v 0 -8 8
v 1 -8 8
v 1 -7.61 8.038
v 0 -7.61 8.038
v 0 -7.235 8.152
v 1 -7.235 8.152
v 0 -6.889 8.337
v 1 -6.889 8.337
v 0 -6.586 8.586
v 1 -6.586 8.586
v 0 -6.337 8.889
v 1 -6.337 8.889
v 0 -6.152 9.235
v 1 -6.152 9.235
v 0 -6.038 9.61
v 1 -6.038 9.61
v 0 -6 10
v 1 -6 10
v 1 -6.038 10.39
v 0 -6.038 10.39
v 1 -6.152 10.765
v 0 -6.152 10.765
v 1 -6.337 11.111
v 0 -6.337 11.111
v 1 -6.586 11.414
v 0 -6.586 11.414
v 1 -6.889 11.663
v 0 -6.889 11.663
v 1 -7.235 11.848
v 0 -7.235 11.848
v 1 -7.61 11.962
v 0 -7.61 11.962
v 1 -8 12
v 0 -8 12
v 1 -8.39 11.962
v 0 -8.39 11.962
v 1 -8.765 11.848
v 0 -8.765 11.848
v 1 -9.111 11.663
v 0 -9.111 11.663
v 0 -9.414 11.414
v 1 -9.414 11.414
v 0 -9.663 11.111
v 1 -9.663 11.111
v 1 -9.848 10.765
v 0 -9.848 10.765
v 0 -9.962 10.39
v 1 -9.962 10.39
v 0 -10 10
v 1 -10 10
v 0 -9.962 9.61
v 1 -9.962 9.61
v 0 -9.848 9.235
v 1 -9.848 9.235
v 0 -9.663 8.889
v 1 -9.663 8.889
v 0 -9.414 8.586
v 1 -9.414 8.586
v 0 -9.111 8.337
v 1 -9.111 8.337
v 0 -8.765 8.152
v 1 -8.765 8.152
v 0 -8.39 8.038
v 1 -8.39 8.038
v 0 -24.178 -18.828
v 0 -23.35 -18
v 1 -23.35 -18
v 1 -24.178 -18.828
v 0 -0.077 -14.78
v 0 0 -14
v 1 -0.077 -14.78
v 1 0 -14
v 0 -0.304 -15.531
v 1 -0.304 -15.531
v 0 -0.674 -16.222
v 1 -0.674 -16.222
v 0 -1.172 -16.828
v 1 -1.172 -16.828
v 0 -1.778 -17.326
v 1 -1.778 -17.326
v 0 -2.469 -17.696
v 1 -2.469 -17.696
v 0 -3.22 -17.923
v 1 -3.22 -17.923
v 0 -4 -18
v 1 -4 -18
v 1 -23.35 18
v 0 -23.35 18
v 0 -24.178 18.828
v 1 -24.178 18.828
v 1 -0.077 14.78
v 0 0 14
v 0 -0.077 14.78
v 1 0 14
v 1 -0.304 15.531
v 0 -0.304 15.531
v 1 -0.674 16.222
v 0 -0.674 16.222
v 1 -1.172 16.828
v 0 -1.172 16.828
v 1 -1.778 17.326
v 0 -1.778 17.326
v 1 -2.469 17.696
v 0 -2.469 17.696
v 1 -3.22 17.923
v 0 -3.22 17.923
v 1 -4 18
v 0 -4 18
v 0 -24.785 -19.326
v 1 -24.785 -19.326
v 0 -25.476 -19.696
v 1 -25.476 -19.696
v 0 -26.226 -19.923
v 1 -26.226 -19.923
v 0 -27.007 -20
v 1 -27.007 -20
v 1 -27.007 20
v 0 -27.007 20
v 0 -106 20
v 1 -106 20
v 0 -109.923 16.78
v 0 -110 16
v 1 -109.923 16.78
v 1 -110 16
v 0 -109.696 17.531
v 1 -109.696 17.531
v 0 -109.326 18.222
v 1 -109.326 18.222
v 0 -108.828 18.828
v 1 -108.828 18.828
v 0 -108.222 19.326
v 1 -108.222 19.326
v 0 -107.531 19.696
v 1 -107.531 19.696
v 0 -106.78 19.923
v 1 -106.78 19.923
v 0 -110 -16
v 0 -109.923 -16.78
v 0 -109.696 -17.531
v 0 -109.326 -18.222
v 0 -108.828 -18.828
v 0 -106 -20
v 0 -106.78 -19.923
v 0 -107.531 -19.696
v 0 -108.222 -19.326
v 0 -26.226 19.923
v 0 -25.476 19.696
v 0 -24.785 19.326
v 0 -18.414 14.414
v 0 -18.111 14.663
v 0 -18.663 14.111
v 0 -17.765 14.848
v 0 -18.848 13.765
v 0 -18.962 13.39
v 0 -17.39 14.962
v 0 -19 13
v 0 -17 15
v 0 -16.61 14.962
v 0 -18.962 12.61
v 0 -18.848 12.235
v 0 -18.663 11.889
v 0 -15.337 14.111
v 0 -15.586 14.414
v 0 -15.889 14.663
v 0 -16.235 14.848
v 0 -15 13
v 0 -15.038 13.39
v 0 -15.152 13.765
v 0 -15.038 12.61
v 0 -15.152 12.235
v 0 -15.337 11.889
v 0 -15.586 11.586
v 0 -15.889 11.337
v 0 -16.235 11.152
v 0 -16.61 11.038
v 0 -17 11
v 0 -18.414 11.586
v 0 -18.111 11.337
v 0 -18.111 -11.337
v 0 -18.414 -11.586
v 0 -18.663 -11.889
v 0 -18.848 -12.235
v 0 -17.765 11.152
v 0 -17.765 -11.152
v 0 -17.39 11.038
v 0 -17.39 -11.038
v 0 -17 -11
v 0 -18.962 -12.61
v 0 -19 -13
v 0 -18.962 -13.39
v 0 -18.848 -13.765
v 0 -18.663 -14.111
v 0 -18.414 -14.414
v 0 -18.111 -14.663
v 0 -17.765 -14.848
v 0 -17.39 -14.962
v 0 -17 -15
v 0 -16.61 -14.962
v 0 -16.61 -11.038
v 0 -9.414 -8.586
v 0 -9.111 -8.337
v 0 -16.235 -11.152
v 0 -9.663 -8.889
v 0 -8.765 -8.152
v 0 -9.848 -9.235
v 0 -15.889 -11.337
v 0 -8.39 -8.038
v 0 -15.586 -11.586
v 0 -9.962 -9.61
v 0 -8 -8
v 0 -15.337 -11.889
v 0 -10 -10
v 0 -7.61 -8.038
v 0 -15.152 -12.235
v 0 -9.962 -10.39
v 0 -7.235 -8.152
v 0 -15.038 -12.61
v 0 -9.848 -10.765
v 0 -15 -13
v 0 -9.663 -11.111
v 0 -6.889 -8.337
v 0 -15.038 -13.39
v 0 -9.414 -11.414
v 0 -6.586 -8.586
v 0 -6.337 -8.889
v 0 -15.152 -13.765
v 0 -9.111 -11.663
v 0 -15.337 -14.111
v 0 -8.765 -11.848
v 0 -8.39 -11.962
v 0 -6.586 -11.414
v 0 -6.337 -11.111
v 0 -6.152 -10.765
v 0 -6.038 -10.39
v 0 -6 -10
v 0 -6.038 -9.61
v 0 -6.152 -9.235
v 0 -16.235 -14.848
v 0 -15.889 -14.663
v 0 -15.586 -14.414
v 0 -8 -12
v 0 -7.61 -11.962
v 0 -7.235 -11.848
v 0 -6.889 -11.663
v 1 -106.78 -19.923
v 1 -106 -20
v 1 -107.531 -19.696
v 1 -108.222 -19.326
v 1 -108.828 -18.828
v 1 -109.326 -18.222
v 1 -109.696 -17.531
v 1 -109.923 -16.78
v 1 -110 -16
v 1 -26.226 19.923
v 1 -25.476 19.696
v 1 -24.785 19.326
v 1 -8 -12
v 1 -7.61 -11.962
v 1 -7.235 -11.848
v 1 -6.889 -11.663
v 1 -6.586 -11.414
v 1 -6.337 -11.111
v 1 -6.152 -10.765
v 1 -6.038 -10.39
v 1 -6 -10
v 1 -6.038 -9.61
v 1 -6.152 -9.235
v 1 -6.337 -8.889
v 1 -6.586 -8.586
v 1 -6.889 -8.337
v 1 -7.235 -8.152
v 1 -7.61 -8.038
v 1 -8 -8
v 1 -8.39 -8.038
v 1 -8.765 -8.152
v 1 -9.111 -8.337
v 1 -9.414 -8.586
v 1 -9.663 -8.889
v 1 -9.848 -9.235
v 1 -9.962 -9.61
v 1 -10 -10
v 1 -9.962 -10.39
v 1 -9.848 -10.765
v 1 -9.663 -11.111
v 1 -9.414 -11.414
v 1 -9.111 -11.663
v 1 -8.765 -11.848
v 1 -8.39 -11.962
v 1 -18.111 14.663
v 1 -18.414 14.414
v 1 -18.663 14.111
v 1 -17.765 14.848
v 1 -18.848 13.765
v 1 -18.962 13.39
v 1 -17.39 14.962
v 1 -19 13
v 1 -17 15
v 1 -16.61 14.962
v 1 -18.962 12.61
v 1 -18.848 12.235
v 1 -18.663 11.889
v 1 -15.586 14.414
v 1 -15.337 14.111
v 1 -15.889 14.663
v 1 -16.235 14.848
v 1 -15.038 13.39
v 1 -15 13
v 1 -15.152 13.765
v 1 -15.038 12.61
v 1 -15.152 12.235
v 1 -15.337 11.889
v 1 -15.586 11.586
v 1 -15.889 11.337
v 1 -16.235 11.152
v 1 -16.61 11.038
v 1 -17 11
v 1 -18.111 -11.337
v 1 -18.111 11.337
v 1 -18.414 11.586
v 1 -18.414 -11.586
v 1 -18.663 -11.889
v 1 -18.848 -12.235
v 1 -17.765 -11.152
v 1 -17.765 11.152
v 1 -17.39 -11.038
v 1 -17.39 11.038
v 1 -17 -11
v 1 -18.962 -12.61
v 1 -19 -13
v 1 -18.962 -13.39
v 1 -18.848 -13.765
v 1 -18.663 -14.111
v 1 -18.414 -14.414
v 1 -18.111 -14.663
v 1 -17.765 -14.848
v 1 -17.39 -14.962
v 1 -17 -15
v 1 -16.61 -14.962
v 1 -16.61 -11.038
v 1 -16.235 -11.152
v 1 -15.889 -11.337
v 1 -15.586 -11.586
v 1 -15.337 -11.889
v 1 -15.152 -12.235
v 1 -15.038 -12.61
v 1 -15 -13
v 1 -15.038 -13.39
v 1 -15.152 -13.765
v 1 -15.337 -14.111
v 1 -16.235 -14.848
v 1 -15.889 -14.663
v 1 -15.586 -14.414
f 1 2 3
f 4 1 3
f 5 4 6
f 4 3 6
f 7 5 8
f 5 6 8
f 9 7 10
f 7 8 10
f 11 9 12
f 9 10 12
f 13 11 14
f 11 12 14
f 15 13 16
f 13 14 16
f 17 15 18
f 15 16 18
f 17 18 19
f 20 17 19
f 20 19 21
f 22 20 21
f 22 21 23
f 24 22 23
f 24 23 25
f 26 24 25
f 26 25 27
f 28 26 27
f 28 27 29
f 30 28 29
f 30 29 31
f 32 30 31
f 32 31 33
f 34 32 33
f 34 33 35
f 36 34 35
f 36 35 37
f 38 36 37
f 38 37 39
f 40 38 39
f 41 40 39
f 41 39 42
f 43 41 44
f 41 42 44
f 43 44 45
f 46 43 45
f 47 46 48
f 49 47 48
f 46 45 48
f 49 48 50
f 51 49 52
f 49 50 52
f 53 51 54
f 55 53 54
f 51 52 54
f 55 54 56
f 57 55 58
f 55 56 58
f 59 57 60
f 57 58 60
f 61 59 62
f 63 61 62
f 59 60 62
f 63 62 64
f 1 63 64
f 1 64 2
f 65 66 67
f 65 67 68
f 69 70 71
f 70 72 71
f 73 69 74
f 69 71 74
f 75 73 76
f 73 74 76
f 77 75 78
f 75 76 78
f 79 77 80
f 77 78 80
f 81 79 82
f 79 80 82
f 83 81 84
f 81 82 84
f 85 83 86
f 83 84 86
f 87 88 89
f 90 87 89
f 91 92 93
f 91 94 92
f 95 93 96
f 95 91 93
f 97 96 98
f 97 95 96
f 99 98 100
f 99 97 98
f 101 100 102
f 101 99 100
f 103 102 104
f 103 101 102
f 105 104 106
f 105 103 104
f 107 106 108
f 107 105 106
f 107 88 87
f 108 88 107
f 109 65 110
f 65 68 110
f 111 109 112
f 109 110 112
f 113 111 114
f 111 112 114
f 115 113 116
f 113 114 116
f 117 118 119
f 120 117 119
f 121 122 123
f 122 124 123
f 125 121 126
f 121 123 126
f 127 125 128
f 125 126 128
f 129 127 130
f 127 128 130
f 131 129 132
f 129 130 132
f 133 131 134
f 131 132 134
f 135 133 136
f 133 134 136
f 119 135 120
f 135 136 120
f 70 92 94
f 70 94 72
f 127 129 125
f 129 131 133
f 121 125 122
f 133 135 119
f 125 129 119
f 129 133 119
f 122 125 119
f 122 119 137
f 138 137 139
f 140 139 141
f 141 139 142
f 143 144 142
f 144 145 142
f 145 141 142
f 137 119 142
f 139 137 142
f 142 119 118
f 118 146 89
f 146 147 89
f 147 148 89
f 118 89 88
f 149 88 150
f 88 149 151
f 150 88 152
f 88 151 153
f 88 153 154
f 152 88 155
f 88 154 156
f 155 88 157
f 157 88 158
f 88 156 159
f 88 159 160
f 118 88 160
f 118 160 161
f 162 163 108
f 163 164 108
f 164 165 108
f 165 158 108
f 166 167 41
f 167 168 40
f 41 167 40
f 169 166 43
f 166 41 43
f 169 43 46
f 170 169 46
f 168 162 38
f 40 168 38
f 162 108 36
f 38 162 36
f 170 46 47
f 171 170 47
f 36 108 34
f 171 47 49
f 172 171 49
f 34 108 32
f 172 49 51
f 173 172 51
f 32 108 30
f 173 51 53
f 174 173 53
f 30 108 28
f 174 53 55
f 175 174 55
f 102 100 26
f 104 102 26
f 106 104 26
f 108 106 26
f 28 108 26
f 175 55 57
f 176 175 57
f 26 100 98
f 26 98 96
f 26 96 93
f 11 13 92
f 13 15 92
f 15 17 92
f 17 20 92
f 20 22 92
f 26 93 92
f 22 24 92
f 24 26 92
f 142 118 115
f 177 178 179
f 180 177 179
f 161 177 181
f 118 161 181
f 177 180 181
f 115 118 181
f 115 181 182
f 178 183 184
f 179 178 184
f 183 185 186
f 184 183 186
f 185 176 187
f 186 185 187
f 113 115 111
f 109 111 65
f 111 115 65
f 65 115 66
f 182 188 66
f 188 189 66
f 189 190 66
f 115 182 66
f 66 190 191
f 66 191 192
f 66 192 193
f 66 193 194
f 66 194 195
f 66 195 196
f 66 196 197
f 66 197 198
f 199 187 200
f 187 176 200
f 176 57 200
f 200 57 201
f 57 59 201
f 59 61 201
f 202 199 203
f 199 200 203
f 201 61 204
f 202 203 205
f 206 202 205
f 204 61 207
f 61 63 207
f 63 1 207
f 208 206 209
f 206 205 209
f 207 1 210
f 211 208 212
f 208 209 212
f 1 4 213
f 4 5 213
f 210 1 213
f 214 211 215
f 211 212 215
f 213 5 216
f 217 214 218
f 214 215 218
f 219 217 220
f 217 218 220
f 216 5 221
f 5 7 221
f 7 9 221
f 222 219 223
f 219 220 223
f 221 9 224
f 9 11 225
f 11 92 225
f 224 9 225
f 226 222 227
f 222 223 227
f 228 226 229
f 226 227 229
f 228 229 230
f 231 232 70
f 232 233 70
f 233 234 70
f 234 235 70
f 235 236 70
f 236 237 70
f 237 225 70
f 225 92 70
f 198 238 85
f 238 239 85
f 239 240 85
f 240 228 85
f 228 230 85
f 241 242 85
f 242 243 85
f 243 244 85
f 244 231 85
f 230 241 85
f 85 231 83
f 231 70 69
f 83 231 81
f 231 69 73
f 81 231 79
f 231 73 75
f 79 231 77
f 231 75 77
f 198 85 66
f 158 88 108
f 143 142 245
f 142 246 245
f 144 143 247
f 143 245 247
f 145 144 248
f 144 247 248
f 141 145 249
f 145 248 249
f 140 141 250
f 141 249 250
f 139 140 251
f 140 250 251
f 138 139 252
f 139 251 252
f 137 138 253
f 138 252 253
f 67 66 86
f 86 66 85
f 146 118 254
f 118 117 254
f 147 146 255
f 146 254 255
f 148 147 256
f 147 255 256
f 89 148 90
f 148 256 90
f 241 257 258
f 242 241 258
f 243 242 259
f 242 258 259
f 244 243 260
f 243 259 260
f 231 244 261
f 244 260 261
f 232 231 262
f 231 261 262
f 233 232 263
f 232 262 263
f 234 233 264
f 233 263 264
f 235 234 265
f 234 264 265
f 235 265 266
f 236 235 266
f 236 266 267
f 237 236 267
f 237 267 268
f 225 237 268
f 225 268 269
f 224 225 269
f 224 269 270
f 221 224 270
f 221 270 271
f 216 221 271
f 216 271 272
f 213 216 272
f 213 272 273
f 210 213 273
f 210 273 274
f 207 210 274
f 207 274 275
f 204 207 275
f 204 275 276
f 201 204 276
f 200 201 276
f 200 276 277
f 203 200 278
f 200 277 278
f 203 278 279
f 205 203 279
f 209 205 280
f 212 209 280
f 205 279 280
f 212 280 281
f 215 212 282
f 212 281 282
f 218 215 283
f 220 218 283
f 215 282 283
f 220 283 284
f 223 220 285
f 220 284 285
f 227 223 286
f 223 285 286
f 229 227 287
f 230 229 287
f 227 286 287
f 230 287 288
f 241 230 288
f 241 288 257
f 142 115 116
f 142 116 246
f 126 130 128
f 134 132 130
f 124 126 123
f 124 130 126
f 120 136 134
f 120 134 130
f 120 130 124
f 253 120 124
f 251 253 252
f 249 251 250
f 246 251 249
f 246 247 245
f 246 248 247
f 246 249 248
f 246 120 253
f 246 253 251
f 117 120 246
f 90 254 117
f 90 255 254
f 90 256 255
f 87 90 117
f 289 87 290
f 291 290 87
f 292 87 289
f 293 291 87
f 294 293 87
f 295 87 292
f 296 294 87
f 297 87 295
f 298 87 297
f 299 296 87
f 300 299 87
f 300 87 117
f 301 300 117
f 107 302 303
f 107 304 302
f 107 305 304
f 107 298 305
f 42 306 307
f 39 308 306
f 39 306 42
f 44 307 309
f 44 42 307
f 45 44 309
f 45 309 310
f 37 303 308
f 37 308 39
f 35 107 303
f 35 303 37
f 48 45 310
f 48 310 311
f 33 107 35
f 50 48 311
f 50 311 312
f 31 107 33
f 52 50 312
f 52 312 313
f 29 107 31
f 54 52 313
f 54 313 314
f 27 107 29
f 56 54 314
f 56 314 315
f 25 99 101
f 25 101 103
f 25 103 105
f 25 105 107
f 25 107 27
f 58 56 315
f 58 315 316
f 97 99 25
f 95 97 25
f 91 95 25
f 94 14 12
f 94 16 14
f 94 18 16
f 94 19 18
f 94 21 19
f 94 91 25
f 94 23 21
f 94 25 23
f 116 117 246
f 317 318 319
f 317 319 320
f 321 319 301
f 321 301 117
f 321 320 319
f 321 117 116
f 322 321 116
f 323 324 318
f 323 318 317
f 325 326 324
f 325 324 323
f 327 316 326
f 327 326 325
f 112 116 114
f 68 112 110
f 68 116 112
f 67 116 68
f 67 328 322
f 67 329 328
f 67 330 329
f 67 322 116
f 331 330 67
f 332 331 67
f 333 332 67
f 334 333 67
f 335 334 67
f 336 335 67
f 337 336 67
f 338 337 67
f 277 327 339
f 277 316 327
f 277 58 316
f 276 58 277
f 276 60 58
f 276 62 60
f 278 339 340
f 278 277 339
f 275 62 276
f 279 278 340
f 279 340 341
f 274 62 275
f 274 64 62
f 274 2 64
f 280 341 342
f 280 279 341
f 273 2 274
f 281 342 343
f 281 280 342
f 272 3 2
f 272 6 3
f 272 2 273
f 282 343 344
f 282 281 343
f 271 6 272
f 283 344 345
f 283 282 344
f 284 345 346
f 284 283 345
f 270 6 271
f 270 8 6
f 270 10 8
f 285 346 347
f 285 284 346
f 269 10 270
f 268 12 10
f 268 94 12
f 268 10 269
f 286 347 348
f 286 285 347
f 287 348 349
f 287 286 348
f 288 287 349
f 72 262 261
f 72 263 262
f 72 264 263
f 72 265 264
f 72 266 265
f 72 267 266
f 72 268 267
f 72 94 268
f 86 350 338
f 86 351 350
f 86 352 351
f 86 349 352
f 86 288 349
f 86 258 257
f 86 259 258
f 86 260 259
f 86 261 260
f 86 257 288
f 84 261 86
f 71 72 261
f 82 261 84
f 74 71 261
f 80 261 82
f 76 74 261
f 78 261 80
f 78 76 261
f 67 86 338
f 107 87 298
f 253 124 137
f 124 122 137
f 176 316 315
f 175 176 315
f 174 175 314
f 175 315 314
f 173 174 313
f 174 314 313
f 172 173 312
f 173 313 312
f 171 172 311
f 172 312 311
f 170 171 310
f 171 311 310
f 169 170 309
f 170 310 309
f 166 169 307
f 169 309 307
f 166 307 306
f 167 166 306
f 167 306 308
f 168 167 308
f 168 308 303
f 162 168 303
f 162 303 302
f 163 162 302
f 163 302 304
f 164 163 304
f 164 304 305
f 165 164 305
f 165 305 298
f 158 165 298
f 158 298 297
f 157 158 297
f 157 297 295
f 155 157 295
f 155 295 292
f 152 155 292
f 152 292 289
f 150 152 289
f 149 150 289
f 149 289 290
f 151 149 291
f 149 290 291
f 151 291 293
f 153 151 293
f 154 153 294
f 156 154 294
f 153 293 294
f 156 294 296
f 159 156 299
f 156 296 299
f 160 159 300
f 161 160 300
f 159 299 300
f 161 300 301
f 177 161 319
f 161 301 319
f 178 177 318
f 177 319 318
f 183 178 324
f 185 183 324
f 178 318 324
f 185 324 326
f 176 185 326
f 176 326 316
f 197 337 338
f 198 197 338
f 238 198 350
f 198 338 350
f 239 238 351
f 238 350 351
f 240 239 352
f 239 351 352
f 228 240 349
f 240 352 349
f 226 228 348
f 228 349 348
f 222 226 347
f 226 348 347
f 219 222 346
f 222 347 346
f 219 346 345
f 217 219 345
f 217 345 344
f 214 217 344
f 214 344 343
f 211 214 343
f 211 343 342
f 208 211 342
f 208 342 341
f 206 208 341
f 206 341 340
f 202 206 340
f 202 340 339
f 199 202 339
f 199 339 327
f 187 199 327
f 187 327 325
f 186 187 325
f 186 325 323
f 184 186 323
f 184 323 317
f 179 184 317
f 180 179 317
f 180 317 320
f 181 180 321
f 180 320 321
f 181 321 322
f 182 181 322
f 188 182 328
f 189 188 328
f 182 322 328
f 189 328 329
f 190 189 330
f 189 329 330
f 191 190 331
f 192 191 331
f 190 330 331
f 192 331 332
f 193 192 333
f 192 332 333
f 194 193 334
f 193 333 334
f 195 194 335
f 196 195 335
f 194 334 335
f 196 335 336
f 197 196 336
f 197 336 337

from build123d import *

# Parameters (mm, degrees)
SKETCH1_W                = 36
SKETCH1_H                = 110
BOSS_EXTRUDE1_DEPTH      = 1
F_4_0_4_DIAMETER_HOLE2_D = 4
F_4_0_4_DIAMETER_HOLE3_D = 4
BOSS_EXTRUDE2_DEPTH      = 1
FILLET1_R                = 4
FILLET2_R                = 4


with BuildPart() as part:
    # Sketch1 → Boss-Extrude1 (new body)
    with BuildSketch(Plane(origin=(0, 0, 0), x_dir=(0, 0, -1), z_dir=(1, 0, 0))):
        with Locations((0, -55)):
            Rectangle(SKETCH1_W, SKETCH1_H)
    extrude(amount=BOSS_EXTRUDE1_DEPTH)

    # Ø4.0 (4) Diameter Hole2 (through all)
    with Locations(Plane.ZY):
        with Locations((-10, -8), (10, -8)):
            Hole(F_4_0_4_DIAMETER_HOLE2_D / 2)

    # Ø4.0 (4) Diameter Hole3 (through all)
    with Locations(Plane.ZY):
        with Locations((-13, -17), (13, -17)):
            Hole(F_4_0_4_DIAMETER_HOLE3_D / 2)

    # Sketch9 → Boss-Extrude2 (add)
    with BuildSketch(Plane.ZY):
        Polygon((18, -23.35), (20, -25.35), (20, -110), (18, -110), align=None)
        Polygon((-18, -23.35), (-20, -25.35), (-20, -110), (-18, -110), align=None)
    extrude(amount=-BOSS_EXTRUDE2_DEPTH)

    # Fillet1
    fillet1_edges = [part.edges().sort_by_distance(p)[0] for p in [
        (0.5, 0, 18),
        (0.5, 0, -18),
    ]]
    fillet(fillet1_edges, radius=FILLET1_R)

    # Fillet2
    fillet2_edges = [part.edges().sort_by_distance(p)[0] for p in [
        (0.5, -25.35, 20),
        (0.5, -110, 20),
        (0.5, -110, -20),
        (0.5, -25.35, -20),
    ]]
    fillet(fillet2_edges, radius=FILLET2_R)


solid = part.part
